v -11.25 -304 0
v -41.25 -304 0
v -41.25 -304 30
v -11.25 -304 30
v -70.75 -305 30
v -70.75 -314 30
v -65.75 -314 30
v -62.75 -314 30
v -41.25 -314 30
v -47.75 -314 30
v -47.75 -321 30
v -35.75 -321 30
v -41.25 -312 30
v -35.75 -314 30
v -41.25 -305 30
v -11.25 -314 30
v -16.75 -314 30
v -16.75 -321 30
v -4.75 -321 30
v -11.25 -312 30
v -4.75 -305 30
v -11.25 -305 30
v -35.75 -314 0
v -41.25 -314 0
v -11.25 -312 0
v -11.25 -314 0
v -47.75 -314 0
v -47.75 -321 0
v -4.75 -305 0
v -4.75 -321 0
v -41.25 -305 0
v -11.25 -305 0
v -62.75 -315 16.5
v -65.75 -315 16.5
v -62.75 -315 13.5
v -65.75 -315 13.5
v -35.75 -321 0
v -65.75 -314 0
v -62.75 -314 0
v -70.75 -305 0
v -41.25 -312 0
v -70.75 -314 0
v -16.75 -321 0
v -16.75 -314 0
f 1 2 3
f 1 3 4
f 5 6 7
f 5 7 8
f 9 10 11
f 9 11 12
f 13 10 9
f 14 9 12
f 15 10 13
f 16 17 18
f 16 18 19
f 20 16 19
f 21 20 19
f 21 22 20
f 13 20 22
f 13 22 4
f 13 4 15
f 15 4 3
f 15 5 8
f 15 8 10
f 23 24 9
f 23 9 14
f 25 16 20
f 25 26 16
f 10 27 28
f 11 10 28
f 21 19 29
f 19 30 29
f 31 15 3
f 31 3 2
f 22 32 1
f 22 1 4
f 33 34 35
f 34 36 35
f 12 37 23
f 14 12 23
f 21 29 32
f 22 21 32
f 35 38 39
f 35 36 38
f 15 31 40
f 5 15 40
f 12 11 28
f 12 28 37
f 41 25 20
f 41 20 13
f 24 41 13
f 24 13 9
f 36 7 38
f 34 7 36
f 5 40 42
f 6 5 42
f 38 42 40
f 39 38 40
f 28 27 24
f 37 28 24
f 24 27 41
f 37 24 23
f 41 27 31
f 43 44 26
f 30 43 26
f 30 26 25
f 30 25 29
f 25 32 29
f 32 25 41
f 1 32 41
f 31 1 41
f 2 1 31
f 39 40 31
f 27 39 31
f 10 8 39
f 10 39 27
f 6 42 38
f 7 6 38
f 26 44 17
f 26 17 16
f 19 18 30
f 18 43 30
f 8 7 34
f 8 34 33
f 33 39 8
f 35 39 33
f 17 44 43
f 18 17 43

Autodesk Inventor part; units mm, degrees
ref_plane "YZ Plane" through (0, 0, 0) normal (1, 0, 0) x (0, 1, 0)
ref_plane "XZ Plane" through (0, 0, 0) normal (0, 1, 0) x (-1, 0, 0)
ref_plane "XY Plane" through (0, 0, 0) normal (0, 0, 1) x (1, 0, 0)
sketch "Skizze1" plane through (0, 0, 0) normal (0, 0, 1) x (1, 0, 0)
  line L0 (-41.25, -314) -> (-33.75, -314) projected
  line L1 (-41.25, -312) -> (-41.25, -314) projected
  line L2 (-11.25, -312) -> (-41.25, -312) projected
  line L3 (-18.75, -314) -> (-11.25, -314) projected
  line L4 (-11.25, -314) -> (-11.25, -312) projected
  line L5 (-18.75, -314) -> (-16.75, -314)
  line L6 (-16.75, -314) -> (-16.75, -321)
  line L7 (-16.75, -321) -> (-4.75, -321)
  line L8 (-4.75, -321) -> (-4.75, -305)
  line L9 (-4.75, -305) -> (-70.75, -305)
  line L10 (-70.75, -305) -> (-70.75, -314)
  line L11 (-47.75, -314) -> (-47.75, -321)
  line L12 (-47.75, -321) -> (-35.75, -321)
  line L13 (-35.75, -321) -> (-35.75, -314)
  line L14 (-35.75, -314) -> (-33.75, -314)
  line L15 (-70.75, -314) -> (-65.75, -314)
  line L16 (-65.75, -314) -> (-65.75, -315)
  line L17 (-65.75, -315) -> (-62.75, -315)
  line L18 (-62.75, -315) -> (-62.75, -314)
  line L19 (-62.75, -314) -> (-47.75, -314)
  line L20 (-26.25, -311) -> (-26.25, -312) construction
  point P0 (0, 0)
  point P1 (-64.25, -315)
  dimension "d0" = 2
  dimension "d1" = 7
  dimension "d2" = 12
  dimension "d3" = 16
  dimension "d4" = 12
  dimension "d5" = 2
  dimension "d6" = 3
  dimension "d7" = 38
  dimension "d8" = 5
  dimension "d9" = 1
extrude "Extrusion1" add sketch "Skizze1" along normal blind 30
chamfer "Fasen1" distance 1 distance2 13.5 1 edges at (-64.25, -315, 30) measured on face at (-38.9167, -307.3333, 30)
chamfer "Fasen2" distance 1 distance2 13.5 1 edges at (-64.25, -315, 0) measured on face at (-38.9167, -307.3333, 0)
sketch "Skizze2" plane through (-70.75, -305, 0) normal (0, 1, 0) x (1, 0, 0)
  line L0 (29.5, 0) -> (59.5, 0) projected
  line L1 (59.5, 0) -> (59.5, -30) projected
  line L2 (29.5, 0) -> (59.5, 0)
  line L3 (59.5, 0) -> (59.5, -30)
  line L4 (59.5, -30) -> (29.5, -30)
  line L5 (29.5, -30) -> (29.5, 0)
  point P0 (70.75, 0)
extrude "Extrusion2" add sketch "Skizze2" along normal blind 1
properties part number "KatzeFEM" material "Aluminium 6061, Katze"
